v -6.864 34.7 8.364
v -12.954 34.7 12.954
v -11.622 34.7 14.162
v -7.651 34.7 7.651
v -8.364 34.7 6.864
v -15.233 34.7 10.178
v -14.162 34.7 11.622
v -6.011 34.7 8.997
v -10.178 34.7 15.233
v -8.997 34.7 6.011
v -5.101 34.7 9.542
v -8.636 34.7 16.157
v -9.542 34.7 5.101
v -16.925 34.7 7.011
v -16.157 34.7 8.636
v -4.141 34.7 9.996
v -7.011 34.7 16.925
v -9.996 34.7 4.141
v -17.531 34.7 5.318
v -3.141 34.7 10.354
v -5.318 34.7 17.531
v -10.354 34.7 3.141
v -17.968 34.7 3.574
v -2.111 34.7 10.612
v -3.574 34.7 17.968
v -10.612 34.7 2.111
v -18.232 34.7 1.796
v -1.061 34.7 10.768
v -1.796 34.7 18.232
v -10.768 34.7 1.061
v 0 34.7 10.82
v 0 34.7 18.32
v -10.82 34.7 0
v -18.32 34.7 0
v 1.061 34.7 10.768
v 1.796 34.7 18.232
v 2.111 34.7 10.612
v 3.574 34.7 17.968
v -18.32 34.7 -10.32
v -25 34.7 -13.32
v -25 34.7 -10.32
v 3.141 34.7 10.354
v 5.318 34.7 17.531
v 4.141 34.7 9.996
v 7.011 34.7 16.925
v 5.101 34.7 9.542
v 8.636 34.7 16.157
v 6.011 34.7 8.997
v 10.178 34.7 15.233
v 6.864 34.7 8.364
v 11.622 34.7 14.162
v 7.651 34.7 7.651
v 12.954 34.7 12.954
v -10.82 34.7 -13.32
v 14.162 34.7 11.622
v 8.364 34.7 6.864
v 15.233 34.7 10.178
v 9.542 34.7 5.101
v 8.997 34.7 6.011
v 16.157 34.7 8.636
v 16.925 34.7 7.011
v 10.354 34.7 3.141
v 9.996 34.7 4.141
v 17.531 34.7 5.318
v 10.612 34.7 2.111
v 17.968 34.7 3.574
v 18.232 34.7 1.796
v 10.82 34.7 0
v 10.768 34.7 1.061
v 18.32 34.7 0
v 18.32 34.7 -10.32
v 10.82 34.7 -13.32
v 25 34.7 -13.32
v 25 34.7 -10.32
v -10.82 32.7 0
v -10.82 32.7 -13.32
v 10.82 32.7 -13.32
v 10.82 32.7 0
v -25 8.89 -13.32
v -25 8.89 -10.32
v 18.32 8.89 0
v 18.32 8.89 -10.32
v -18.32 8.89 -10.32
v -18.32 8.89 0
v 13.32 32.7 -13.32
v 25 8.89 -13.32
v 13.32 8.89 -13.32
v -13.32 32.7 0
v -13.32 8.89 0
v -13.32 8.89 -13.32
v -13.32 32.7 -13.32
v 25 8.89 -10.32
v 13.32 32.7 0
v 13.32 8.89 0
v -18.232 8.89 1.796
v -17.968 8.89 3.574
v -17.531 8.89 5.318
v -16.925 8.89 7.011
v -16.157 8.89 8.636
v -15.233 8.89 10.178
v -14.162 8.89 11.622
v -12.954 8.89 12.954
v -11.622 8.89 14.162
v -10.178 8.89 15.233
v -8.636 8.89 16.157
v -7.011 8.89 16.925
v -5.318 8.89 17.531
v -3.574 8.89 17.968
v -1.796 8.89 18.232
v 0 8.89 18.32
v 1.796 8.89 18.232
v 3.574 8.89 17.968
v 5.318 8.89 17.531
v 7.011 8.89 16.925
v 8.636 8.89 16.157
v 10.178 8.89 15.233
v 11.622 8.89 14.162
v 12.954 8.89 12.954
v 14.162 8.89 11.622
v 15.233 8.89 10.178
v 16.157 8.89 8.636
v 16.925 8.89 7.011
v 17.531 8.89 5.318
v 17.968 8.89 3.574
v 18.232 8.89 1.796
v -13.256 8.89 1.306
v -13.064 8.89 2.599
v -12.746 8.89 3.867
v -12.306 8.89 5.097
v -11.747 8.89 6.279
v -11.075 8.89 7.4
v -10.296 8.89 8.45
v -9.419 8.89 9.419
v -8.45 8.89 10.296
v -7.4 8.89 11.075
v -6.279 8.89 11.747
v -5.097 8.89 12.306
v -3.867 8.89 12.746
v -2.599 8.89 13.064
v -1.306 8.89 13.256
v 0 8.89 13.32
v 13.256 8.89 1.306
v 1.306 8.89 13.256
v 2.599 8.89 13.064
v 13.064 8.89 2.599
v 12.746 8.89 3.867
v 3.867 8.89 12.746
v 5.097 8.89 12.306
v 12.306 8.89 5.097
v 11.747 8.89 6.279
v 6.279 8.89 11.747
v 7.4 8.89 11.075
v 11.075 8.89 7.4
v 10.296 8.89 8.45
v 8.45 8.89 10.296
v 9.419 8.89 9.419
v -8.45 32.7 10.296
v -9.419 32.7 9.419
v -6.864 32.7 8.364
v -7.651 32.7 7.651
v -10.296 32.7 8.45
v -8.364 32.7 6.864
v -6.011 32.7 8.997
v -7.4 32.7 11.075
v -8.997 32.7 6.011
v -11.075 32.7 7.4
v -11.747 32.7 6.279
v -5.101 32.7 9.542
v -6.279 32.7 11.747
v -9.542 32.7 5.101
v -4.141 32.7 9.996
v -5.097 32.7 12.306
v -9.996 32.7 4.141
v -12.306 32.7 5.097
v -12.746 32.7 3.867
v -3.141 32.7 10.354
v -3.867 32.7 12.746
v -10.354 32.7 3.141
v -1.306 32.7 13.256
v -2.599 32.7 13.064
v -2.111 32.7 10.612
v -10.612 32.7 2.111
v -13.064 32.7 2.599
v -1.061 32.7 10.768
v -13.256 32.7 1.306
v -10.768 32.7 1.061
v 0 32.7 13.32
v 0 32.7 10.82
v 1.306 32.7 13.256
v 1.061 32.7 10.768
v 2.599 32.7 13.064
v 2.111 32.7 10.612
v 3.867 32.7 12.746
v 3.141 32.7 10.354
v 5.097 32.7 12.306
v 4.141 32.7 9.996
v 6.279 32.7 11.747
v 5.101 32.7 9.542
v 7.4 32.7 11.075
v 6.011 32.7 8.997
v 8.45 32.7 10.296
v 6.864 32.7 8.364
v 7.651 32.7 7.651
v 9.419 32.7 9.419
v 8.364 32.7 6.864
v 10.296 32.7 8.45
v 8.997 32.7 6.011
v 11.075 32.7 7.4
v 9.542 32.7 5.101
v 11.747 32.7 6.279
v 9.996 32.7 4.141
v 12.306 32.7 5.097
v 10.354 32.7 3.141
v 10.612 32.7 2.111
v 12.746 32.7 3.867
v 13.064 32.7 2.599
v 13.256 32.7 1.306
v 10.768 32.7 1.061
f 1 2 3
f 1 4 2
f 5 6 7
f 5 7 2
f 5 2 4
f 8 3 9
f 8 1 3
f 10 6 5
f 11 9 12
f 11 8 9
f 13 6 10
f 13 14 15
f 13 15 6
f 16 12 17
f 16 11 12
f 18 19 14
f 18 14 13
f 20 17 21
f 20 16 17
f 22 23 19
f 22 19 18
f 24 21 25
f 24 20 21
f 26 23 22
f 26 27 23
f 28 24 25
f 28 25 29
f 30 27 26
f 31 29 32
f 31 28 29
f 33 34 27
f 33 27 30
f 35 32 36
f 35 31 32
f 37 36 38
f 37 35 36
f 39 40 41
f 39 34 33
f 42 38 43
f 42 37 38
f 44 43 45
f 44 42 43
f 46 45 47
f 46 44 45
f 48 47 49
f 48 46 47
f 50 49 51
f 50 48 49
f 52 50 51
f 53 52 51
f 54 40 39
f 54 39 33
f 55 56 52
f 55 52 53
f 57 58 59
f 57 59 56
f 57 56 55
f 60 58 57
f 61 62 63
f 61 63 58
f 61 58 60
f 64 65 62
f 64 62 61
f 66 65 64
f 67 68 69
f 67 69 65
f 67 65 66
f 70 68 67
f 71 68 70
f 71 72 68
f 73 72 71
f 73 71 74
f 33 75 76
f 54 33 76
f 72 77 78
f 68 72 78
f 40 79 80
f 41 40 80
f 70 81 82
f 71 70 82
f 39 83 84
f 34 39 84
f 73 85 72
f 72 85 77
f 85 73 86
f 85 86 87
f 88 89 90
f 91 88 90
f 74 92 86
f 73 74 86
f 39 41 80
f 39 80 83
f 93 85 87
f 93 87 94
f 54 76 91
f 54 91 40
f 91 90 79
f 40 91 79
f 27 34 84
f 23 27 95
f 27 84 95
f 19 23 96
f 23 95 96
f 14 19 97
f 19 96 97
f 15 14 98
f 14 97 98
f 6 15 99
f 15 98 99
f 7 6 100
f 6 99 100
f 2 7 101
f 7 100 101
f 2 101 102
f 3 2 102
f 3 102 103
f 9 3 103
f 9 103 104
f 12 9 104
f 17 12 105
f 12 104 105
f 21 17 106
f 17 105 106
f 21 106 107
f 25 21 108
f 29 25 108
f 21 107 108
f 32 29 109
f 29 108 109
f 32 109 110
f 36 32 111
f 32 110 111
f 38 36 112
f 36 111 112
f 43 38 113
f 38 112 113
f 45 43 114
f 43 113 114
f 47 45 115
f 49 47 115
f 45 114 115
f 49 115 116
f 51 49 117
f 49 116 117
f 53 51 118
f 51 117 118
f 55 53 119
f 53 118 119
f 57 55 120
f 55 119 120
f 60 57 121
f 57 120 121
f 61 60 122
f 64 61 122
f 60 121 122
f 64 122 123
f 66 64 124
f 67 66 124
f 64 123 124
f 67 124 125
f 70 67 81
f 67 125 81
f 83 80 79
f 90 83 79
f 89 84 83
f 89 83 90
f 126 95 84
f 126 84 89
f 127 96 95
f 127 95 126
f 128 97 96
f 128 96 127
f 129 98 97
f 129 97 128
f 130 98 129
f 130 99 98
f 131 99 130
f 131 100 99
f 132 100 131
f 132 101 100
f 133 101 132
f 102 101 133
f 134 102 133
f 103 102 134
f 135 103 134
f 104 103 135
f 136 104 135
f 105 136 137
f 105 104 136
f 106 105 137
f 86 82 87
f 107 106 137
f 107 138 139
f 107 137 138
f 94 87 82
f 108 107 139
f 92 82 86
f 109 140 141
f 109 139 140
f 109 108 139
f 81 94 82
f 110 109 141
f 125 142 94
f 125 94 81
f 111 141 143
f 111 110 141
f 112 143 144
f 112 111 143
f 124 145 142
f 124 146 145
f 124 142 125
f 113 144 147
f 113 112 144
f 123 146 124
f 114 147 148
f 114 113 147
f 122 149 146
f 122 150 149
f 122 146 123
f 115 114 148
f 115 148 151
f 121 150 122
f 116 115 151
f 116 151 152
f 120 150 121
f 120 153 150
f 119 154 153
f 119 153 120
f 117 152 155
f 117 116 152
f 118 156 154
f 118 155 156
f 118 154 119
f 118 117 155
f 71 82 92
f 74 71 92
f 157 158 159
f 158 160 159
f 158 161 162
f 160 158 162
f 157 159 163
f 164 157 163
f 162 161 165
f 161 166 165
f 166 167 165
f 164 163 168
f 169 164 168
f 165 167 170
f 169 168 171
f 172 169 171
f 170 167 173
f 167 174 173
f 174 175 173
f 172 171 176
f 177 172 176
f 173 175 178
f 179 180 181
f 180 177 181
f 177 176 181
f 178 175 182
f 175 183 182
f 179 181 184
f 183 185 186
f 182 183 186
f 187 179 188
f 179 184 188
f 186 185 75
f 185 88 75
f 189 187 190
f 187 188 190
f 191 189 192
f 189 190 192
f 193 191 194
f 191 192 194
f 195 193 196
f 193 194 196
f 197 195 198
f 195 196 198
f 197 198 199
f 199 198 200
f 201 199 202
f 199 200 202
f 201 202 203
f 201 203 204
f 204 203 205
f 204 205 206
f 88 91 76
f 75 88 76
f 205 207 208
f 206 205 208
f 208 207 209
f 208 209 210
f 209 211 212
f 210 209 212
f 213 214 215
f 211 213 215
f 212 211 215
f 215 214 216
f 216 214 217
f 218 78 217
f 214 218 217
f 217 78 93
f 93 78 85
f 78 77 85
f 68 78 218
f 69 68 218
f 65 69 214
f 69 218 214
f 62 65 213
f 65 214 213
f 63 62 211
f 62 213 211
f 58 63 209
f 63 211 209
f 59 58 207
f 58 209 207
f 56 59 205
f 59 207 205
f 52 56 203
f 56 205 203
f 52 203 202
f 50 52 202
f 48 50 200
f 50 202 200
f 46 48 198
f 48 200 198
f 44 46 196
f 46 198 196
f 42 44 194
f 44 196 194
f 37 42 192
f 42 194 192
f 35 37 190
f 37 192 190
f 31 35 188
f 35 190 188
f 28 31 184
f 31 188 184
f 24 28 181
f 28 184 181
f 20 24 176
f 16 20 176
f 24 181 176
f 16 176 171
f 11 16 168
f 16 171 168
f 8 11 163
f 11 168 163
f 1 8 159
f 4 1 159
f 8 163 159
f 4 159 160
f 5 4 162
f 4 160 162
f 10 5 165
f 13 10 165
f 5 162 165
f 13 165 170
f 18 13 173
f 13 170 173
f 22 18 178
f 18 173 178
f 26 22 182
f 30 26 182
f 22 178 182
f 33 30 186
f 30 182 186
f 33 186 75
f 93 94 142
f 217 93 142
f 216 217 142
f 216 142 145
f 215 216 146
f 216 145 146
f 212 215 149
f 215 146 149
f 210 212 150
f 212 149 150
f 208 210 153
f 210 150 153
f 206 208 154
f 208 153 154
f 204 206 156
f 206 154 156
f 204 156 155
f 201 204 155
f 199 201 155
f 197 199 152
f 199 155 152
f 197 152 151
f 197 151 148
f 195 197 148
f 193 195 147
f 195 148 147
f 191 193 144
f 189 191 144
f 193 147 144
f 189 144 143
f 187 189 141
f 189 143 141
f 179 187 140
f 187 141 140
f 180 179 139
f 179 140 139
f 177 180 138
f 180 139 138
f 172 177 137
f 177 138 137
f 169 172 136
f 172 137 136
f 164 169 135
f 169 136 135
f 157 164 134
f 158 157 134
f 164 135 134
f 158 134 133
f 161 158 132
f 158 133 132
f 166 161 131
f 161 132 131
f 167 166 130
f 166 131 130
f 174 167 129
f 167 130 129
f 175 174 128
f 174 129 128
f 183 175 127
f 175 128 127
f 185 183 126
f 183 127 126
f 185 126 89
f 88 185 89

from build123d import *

# Parameters (mm, degrees)
BOSS_EXTRUDE1_DEPTH = 20
BOSS_EXTRUDE2_DEPTH = 12.7
BOSS_EXTRUDE3_DEPTH = 2
SKETCH4_W           = 52.357488091
SKETCH4_H           = 8.89
CUT_EXTRUDE1_DEPTH  = 22


with BuildPart() as part:
    # Sketch1 → Boss-Extrude1 (new body)
    with BuildSketch(Plane(origin=(0, 0, 0), x_dir=(1, 0, 0), z_dir=(0, 1, 0))):
        with BuildLine():
            Line((-18.32, 0), (-18.32, 2.075569274))
            Line((-18.32, 2.075569274), (-18.32, 10.32))
            Line((-18.32, 10.32), (-25, 10.32))
            Line((-25, 10.32), (-25, 13.32))
            Line((-25, 13.32), (-13.32, 13.32))
            Line((-13.32, 13.32), (-13.32, 0))
            ThreePointArc((-13.32, 0), (0, -13.32), (13.32, 0))
            Line((13.32, 0), (13.32, 13.32))
            Line((13.32, 13.32), (25, 13.32))
            Line((25, 13.32), (25, 10.32))
            Line((25, 10.32), (18.32, 10.32))
            Line((18.32, 10.32), (18.32, 1.685292353))
            Line((18.32, 1.685292353), (18.32, 0))
            ThreePointArc((18.32, 0), (0, -18.32), (-18.32, 0))
        make_face()
    extrude(amount=BOSS_EXTRUDE1_DEPTH)

    # Sketch2 → Boss-Extrude2 (add)
    with BuildSketch(Plane(origin=(0, 20, 0), x_dir=(1, 0, 0), z_dir=(0, 1, 0))):
        with BuildLine():
            Line((-18.32, 10.32), (-18.32, 0))
            ThreePointArc((-18.32, 0), (0, -18.32), (18.32, 0))
            Line((18.32, 0), (18.32, 10.32))
            Line((18.32, 10.32), (25, 10.32))
            Line((25, 10.32), (25, 13.32))
            Line((25, 13.32), (13.32, 13.32))
            Line((13.32, 13.32), (13.32, 0))
            ThreePointArc((13.32, 0), (0, -13.32), (-13.32, 0))
            Line((-13.32, 0), (-13.32, 13.32))
            Line((-13.32, 13.32), (-25, 13.32))
            Line((-25, 13.32), (-25, 10.32))
            Line((-25, 10.32), (-18.32, 10.32))
        make_face()
    extrude(amount=BOSS_EXTRUDE2_DEPTH)

    # Sketch3 → Boss-Extrude3 (add)
    with BuildSketch(Plane(origin=(0, 32.7, 0), x_dir=(1, 0, 0), z_dir=(0, 1, 0))):
        with BuildLine():
            Line((-10.82, 13.32), (-13.32, 13.32))
            Line((-13.32, 13.32), (-13.32, 0))
            ThreePointArc((-13.32, 0), (0, -13.32), (13.32, 0))
            Line((13.32, 0), (13.32, 13.32))
            Line((13.32, 13.32), (10.82, 13.32))
            Line((10.82, 13.32), (10.82, 0))
            ThreePointArc((10.82, 0), (0, -10.82), (-10.82, 0))
            Line((-10.82, 0), (-10.82, 13.32))
        make_face()
        with BuildLine():
            Line((-25, 13.32), (-25, 10.32))
            Line((-25, 10.32), (-18.32, 10.32))
            Line((-18.32, 10.32), (-18.32, 0))
            ThreePointArc((-18.32, 0), (0, -18.32), (18.32, 0))
            Line((18.32, 0), (18.32, 10.32))
            Line((18.32, 10.32), (25, 10.32))
            Line((25, 10.32), (25, 13.32))
            Line((25, 13.32), (13.32, 13.32))
            Line((13.32, 13.32), (13.32, 0))
            ThreePointArc((13.32, 0), (0, -13.32), (-13.32, 0))
            Line((-13.32, 0), (-13.32, 13.32))
            Line((-13.32, 13.32), (-25, 13.32))
        make_face()
    extrude(amount=BOSS_EXTRUDE3_DEPTH)

    # Sketch4 → Cut-Extrude1 (cut, symmetric)
    with BuildSketch(Plane.XY):
        with Locations((1.178744046, 4.445)):
            Rectangle(SKETCH4_W, SKETCH4_H)
    extrude(amount=CUT_EXTRUDE1_DEPTH, both=True, mode=Mode.SUBTRACT)


solid = part.part
